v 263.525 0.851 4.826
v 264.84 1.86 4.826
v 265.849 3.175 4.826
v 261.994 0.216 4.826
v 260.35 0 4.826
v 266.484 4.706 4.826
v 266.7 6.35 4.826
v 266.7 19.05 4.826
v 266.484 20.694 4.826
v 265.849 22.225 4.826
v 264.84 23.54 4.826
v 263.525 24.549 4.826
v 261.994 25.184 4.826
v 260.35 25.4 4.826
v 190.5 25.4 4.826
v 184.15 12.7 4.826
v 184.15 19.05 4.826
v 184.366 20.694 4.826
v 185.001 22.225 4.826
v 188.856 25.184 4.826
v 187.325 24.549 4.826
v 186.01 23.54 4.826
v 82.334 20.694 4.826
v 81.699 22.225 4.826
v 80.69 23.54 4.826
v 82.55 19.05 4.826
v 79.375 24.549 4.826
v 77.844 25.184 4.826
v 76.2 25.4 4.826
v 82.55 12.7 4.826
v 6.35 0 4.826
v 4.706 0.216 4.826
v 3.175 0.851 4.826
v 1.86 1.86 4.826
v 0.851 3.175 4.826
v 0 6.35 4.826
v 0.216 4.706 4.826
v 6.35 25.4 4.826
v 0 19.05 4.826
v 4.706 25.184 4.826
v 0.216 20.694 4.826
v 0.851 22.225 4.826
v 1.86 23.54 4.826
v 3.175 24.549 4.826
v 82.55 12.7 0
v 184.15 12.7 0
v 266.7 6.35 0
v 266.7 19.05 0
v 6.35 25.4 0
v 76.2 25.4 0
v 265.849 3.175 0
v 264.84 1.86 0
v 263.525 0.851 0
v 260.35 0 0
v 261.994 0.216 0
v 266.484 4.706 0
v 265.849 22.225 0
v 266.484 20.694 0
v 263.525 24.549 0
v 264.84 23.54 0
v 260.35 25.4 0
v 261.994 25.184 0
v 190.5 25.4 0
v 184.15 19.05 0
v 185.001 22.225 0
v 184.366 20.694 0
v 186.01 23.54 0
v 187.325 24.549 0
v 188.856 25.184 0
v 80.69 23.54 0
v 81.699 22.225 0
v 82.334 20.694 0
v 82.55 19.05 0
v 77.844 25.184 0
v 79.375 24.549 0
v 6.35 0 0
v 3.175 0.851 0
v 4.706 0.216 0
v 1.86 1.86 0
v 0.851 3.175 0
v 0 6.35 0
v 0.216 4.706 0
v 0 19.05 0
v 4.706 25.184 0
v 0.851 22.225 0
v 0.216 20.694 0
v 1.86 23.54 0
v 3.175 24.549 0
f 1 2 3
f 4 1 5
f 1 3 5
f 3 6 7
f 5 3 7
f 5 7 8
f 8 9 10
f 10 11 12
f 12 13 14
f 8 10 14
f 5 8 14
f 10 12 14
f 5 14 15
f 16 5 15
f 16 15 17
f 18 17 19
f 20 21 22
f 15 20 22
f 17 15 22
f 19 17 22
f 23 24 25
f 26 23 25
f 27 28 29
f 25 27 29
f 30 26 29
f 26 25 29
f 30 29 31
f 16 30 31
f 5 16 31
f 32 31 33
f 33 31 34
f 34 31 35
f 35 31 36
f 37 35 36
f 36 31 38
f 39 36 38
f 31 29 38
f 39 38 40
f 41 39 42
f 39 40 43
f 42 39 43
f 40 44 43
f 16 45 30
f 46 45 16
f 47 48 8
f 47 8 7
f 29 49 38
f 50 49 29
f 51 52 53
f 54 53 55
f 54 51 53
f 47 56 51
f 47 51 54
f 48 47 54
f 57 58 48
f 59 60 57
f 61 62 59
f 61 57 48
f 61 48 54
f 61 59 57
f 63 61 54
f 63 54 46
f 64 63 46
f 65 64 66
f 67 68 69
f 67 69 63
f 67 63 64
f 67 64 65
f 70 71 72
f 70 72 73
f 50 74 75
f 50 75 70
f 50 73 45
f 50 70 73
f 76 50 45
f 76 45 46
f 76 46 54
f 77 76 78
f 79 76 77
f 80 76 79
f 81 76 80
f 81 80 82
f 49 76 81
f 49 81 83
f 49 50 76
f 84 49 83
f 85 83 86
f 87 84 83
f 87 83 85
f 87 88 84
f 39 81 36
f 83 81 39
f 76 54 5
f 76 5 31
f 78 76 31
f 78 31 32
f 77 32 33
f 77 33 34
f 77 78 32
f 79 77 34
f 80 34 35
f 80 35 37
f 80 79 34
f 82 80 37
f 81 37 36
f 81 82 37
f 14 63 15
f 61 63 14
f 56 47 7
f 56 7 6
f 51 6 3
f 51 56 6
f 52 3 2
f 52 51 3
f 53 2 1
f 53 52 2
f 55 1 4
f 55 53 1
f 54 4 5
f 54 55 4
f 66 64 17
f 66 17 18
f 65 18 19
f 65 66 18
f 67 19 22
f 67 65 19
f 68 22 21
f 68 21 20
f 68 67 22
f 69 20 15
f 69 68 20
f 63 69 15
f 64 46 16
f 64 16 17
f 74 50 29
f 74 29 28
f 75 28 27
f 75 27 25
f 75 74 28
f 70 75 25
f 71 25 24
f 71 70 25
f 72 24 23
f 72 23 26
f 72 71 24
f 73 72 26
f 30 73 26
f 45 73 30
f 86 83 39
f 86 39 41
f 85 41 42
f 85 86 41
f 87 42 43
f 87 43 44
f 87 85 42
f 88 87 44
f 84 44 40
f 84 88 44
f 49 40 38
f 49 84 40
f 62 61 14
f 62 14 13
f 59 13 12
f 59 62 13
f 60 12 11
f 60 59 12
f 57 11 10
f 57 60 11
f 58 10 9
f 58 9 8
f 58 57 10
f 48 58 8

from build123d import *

# Parameters (mm, degrees)
BOSS_EXTRUDE1_DEPTH = 4.826


with BuildPart() as part:
    # Sketch1 → Boss-Extrude1 (new body)
    with BuildSketch(Plane.XY):
        with BuildLine():
            ThreePointArc((76.2, 25.4), (80.690128061, 23.540128061), (82.55, 19.05))
            Line((82.55, 19.05), (82.55, 12.7))
            Line((82.55, 12.7), (184.15, 12.7))
            Line((184.15, 12.7), (184.15, 19.05))
            ThreePointArc((184.15, 19.05), (186.009871939, 23.540128061), (190.5, 25.4))
            Line((190.5, 25.4), (260.35, 25.4))
            ThreePointArc((260.35, 25.4), (264.840128061, 23.540128061), (266.7, 19.05))
            Line((266.7, 19.05), (266.7, 6.35))
            ThreePointArc((266.7, 6.35), (264.840128061, 1.859871939), (260.35, 0))
            Line((260.35, 0), (6.35, 0))
            ThreePointArc((6.35, 0), (1.859871939, 1.859871939), (0, 6.35))
            Line((0, 6.35), (0, 19.05))
            ThreePointArc((0, 19.05), (1.859871939, 23.540128061), (6.35, 25.4))
            Line((6.35, 25.4), (76.2, 25.4))
        make_face()
    extrude(amount=BOSS_EXTRUDE1_DEPTH)


solid = part.part
